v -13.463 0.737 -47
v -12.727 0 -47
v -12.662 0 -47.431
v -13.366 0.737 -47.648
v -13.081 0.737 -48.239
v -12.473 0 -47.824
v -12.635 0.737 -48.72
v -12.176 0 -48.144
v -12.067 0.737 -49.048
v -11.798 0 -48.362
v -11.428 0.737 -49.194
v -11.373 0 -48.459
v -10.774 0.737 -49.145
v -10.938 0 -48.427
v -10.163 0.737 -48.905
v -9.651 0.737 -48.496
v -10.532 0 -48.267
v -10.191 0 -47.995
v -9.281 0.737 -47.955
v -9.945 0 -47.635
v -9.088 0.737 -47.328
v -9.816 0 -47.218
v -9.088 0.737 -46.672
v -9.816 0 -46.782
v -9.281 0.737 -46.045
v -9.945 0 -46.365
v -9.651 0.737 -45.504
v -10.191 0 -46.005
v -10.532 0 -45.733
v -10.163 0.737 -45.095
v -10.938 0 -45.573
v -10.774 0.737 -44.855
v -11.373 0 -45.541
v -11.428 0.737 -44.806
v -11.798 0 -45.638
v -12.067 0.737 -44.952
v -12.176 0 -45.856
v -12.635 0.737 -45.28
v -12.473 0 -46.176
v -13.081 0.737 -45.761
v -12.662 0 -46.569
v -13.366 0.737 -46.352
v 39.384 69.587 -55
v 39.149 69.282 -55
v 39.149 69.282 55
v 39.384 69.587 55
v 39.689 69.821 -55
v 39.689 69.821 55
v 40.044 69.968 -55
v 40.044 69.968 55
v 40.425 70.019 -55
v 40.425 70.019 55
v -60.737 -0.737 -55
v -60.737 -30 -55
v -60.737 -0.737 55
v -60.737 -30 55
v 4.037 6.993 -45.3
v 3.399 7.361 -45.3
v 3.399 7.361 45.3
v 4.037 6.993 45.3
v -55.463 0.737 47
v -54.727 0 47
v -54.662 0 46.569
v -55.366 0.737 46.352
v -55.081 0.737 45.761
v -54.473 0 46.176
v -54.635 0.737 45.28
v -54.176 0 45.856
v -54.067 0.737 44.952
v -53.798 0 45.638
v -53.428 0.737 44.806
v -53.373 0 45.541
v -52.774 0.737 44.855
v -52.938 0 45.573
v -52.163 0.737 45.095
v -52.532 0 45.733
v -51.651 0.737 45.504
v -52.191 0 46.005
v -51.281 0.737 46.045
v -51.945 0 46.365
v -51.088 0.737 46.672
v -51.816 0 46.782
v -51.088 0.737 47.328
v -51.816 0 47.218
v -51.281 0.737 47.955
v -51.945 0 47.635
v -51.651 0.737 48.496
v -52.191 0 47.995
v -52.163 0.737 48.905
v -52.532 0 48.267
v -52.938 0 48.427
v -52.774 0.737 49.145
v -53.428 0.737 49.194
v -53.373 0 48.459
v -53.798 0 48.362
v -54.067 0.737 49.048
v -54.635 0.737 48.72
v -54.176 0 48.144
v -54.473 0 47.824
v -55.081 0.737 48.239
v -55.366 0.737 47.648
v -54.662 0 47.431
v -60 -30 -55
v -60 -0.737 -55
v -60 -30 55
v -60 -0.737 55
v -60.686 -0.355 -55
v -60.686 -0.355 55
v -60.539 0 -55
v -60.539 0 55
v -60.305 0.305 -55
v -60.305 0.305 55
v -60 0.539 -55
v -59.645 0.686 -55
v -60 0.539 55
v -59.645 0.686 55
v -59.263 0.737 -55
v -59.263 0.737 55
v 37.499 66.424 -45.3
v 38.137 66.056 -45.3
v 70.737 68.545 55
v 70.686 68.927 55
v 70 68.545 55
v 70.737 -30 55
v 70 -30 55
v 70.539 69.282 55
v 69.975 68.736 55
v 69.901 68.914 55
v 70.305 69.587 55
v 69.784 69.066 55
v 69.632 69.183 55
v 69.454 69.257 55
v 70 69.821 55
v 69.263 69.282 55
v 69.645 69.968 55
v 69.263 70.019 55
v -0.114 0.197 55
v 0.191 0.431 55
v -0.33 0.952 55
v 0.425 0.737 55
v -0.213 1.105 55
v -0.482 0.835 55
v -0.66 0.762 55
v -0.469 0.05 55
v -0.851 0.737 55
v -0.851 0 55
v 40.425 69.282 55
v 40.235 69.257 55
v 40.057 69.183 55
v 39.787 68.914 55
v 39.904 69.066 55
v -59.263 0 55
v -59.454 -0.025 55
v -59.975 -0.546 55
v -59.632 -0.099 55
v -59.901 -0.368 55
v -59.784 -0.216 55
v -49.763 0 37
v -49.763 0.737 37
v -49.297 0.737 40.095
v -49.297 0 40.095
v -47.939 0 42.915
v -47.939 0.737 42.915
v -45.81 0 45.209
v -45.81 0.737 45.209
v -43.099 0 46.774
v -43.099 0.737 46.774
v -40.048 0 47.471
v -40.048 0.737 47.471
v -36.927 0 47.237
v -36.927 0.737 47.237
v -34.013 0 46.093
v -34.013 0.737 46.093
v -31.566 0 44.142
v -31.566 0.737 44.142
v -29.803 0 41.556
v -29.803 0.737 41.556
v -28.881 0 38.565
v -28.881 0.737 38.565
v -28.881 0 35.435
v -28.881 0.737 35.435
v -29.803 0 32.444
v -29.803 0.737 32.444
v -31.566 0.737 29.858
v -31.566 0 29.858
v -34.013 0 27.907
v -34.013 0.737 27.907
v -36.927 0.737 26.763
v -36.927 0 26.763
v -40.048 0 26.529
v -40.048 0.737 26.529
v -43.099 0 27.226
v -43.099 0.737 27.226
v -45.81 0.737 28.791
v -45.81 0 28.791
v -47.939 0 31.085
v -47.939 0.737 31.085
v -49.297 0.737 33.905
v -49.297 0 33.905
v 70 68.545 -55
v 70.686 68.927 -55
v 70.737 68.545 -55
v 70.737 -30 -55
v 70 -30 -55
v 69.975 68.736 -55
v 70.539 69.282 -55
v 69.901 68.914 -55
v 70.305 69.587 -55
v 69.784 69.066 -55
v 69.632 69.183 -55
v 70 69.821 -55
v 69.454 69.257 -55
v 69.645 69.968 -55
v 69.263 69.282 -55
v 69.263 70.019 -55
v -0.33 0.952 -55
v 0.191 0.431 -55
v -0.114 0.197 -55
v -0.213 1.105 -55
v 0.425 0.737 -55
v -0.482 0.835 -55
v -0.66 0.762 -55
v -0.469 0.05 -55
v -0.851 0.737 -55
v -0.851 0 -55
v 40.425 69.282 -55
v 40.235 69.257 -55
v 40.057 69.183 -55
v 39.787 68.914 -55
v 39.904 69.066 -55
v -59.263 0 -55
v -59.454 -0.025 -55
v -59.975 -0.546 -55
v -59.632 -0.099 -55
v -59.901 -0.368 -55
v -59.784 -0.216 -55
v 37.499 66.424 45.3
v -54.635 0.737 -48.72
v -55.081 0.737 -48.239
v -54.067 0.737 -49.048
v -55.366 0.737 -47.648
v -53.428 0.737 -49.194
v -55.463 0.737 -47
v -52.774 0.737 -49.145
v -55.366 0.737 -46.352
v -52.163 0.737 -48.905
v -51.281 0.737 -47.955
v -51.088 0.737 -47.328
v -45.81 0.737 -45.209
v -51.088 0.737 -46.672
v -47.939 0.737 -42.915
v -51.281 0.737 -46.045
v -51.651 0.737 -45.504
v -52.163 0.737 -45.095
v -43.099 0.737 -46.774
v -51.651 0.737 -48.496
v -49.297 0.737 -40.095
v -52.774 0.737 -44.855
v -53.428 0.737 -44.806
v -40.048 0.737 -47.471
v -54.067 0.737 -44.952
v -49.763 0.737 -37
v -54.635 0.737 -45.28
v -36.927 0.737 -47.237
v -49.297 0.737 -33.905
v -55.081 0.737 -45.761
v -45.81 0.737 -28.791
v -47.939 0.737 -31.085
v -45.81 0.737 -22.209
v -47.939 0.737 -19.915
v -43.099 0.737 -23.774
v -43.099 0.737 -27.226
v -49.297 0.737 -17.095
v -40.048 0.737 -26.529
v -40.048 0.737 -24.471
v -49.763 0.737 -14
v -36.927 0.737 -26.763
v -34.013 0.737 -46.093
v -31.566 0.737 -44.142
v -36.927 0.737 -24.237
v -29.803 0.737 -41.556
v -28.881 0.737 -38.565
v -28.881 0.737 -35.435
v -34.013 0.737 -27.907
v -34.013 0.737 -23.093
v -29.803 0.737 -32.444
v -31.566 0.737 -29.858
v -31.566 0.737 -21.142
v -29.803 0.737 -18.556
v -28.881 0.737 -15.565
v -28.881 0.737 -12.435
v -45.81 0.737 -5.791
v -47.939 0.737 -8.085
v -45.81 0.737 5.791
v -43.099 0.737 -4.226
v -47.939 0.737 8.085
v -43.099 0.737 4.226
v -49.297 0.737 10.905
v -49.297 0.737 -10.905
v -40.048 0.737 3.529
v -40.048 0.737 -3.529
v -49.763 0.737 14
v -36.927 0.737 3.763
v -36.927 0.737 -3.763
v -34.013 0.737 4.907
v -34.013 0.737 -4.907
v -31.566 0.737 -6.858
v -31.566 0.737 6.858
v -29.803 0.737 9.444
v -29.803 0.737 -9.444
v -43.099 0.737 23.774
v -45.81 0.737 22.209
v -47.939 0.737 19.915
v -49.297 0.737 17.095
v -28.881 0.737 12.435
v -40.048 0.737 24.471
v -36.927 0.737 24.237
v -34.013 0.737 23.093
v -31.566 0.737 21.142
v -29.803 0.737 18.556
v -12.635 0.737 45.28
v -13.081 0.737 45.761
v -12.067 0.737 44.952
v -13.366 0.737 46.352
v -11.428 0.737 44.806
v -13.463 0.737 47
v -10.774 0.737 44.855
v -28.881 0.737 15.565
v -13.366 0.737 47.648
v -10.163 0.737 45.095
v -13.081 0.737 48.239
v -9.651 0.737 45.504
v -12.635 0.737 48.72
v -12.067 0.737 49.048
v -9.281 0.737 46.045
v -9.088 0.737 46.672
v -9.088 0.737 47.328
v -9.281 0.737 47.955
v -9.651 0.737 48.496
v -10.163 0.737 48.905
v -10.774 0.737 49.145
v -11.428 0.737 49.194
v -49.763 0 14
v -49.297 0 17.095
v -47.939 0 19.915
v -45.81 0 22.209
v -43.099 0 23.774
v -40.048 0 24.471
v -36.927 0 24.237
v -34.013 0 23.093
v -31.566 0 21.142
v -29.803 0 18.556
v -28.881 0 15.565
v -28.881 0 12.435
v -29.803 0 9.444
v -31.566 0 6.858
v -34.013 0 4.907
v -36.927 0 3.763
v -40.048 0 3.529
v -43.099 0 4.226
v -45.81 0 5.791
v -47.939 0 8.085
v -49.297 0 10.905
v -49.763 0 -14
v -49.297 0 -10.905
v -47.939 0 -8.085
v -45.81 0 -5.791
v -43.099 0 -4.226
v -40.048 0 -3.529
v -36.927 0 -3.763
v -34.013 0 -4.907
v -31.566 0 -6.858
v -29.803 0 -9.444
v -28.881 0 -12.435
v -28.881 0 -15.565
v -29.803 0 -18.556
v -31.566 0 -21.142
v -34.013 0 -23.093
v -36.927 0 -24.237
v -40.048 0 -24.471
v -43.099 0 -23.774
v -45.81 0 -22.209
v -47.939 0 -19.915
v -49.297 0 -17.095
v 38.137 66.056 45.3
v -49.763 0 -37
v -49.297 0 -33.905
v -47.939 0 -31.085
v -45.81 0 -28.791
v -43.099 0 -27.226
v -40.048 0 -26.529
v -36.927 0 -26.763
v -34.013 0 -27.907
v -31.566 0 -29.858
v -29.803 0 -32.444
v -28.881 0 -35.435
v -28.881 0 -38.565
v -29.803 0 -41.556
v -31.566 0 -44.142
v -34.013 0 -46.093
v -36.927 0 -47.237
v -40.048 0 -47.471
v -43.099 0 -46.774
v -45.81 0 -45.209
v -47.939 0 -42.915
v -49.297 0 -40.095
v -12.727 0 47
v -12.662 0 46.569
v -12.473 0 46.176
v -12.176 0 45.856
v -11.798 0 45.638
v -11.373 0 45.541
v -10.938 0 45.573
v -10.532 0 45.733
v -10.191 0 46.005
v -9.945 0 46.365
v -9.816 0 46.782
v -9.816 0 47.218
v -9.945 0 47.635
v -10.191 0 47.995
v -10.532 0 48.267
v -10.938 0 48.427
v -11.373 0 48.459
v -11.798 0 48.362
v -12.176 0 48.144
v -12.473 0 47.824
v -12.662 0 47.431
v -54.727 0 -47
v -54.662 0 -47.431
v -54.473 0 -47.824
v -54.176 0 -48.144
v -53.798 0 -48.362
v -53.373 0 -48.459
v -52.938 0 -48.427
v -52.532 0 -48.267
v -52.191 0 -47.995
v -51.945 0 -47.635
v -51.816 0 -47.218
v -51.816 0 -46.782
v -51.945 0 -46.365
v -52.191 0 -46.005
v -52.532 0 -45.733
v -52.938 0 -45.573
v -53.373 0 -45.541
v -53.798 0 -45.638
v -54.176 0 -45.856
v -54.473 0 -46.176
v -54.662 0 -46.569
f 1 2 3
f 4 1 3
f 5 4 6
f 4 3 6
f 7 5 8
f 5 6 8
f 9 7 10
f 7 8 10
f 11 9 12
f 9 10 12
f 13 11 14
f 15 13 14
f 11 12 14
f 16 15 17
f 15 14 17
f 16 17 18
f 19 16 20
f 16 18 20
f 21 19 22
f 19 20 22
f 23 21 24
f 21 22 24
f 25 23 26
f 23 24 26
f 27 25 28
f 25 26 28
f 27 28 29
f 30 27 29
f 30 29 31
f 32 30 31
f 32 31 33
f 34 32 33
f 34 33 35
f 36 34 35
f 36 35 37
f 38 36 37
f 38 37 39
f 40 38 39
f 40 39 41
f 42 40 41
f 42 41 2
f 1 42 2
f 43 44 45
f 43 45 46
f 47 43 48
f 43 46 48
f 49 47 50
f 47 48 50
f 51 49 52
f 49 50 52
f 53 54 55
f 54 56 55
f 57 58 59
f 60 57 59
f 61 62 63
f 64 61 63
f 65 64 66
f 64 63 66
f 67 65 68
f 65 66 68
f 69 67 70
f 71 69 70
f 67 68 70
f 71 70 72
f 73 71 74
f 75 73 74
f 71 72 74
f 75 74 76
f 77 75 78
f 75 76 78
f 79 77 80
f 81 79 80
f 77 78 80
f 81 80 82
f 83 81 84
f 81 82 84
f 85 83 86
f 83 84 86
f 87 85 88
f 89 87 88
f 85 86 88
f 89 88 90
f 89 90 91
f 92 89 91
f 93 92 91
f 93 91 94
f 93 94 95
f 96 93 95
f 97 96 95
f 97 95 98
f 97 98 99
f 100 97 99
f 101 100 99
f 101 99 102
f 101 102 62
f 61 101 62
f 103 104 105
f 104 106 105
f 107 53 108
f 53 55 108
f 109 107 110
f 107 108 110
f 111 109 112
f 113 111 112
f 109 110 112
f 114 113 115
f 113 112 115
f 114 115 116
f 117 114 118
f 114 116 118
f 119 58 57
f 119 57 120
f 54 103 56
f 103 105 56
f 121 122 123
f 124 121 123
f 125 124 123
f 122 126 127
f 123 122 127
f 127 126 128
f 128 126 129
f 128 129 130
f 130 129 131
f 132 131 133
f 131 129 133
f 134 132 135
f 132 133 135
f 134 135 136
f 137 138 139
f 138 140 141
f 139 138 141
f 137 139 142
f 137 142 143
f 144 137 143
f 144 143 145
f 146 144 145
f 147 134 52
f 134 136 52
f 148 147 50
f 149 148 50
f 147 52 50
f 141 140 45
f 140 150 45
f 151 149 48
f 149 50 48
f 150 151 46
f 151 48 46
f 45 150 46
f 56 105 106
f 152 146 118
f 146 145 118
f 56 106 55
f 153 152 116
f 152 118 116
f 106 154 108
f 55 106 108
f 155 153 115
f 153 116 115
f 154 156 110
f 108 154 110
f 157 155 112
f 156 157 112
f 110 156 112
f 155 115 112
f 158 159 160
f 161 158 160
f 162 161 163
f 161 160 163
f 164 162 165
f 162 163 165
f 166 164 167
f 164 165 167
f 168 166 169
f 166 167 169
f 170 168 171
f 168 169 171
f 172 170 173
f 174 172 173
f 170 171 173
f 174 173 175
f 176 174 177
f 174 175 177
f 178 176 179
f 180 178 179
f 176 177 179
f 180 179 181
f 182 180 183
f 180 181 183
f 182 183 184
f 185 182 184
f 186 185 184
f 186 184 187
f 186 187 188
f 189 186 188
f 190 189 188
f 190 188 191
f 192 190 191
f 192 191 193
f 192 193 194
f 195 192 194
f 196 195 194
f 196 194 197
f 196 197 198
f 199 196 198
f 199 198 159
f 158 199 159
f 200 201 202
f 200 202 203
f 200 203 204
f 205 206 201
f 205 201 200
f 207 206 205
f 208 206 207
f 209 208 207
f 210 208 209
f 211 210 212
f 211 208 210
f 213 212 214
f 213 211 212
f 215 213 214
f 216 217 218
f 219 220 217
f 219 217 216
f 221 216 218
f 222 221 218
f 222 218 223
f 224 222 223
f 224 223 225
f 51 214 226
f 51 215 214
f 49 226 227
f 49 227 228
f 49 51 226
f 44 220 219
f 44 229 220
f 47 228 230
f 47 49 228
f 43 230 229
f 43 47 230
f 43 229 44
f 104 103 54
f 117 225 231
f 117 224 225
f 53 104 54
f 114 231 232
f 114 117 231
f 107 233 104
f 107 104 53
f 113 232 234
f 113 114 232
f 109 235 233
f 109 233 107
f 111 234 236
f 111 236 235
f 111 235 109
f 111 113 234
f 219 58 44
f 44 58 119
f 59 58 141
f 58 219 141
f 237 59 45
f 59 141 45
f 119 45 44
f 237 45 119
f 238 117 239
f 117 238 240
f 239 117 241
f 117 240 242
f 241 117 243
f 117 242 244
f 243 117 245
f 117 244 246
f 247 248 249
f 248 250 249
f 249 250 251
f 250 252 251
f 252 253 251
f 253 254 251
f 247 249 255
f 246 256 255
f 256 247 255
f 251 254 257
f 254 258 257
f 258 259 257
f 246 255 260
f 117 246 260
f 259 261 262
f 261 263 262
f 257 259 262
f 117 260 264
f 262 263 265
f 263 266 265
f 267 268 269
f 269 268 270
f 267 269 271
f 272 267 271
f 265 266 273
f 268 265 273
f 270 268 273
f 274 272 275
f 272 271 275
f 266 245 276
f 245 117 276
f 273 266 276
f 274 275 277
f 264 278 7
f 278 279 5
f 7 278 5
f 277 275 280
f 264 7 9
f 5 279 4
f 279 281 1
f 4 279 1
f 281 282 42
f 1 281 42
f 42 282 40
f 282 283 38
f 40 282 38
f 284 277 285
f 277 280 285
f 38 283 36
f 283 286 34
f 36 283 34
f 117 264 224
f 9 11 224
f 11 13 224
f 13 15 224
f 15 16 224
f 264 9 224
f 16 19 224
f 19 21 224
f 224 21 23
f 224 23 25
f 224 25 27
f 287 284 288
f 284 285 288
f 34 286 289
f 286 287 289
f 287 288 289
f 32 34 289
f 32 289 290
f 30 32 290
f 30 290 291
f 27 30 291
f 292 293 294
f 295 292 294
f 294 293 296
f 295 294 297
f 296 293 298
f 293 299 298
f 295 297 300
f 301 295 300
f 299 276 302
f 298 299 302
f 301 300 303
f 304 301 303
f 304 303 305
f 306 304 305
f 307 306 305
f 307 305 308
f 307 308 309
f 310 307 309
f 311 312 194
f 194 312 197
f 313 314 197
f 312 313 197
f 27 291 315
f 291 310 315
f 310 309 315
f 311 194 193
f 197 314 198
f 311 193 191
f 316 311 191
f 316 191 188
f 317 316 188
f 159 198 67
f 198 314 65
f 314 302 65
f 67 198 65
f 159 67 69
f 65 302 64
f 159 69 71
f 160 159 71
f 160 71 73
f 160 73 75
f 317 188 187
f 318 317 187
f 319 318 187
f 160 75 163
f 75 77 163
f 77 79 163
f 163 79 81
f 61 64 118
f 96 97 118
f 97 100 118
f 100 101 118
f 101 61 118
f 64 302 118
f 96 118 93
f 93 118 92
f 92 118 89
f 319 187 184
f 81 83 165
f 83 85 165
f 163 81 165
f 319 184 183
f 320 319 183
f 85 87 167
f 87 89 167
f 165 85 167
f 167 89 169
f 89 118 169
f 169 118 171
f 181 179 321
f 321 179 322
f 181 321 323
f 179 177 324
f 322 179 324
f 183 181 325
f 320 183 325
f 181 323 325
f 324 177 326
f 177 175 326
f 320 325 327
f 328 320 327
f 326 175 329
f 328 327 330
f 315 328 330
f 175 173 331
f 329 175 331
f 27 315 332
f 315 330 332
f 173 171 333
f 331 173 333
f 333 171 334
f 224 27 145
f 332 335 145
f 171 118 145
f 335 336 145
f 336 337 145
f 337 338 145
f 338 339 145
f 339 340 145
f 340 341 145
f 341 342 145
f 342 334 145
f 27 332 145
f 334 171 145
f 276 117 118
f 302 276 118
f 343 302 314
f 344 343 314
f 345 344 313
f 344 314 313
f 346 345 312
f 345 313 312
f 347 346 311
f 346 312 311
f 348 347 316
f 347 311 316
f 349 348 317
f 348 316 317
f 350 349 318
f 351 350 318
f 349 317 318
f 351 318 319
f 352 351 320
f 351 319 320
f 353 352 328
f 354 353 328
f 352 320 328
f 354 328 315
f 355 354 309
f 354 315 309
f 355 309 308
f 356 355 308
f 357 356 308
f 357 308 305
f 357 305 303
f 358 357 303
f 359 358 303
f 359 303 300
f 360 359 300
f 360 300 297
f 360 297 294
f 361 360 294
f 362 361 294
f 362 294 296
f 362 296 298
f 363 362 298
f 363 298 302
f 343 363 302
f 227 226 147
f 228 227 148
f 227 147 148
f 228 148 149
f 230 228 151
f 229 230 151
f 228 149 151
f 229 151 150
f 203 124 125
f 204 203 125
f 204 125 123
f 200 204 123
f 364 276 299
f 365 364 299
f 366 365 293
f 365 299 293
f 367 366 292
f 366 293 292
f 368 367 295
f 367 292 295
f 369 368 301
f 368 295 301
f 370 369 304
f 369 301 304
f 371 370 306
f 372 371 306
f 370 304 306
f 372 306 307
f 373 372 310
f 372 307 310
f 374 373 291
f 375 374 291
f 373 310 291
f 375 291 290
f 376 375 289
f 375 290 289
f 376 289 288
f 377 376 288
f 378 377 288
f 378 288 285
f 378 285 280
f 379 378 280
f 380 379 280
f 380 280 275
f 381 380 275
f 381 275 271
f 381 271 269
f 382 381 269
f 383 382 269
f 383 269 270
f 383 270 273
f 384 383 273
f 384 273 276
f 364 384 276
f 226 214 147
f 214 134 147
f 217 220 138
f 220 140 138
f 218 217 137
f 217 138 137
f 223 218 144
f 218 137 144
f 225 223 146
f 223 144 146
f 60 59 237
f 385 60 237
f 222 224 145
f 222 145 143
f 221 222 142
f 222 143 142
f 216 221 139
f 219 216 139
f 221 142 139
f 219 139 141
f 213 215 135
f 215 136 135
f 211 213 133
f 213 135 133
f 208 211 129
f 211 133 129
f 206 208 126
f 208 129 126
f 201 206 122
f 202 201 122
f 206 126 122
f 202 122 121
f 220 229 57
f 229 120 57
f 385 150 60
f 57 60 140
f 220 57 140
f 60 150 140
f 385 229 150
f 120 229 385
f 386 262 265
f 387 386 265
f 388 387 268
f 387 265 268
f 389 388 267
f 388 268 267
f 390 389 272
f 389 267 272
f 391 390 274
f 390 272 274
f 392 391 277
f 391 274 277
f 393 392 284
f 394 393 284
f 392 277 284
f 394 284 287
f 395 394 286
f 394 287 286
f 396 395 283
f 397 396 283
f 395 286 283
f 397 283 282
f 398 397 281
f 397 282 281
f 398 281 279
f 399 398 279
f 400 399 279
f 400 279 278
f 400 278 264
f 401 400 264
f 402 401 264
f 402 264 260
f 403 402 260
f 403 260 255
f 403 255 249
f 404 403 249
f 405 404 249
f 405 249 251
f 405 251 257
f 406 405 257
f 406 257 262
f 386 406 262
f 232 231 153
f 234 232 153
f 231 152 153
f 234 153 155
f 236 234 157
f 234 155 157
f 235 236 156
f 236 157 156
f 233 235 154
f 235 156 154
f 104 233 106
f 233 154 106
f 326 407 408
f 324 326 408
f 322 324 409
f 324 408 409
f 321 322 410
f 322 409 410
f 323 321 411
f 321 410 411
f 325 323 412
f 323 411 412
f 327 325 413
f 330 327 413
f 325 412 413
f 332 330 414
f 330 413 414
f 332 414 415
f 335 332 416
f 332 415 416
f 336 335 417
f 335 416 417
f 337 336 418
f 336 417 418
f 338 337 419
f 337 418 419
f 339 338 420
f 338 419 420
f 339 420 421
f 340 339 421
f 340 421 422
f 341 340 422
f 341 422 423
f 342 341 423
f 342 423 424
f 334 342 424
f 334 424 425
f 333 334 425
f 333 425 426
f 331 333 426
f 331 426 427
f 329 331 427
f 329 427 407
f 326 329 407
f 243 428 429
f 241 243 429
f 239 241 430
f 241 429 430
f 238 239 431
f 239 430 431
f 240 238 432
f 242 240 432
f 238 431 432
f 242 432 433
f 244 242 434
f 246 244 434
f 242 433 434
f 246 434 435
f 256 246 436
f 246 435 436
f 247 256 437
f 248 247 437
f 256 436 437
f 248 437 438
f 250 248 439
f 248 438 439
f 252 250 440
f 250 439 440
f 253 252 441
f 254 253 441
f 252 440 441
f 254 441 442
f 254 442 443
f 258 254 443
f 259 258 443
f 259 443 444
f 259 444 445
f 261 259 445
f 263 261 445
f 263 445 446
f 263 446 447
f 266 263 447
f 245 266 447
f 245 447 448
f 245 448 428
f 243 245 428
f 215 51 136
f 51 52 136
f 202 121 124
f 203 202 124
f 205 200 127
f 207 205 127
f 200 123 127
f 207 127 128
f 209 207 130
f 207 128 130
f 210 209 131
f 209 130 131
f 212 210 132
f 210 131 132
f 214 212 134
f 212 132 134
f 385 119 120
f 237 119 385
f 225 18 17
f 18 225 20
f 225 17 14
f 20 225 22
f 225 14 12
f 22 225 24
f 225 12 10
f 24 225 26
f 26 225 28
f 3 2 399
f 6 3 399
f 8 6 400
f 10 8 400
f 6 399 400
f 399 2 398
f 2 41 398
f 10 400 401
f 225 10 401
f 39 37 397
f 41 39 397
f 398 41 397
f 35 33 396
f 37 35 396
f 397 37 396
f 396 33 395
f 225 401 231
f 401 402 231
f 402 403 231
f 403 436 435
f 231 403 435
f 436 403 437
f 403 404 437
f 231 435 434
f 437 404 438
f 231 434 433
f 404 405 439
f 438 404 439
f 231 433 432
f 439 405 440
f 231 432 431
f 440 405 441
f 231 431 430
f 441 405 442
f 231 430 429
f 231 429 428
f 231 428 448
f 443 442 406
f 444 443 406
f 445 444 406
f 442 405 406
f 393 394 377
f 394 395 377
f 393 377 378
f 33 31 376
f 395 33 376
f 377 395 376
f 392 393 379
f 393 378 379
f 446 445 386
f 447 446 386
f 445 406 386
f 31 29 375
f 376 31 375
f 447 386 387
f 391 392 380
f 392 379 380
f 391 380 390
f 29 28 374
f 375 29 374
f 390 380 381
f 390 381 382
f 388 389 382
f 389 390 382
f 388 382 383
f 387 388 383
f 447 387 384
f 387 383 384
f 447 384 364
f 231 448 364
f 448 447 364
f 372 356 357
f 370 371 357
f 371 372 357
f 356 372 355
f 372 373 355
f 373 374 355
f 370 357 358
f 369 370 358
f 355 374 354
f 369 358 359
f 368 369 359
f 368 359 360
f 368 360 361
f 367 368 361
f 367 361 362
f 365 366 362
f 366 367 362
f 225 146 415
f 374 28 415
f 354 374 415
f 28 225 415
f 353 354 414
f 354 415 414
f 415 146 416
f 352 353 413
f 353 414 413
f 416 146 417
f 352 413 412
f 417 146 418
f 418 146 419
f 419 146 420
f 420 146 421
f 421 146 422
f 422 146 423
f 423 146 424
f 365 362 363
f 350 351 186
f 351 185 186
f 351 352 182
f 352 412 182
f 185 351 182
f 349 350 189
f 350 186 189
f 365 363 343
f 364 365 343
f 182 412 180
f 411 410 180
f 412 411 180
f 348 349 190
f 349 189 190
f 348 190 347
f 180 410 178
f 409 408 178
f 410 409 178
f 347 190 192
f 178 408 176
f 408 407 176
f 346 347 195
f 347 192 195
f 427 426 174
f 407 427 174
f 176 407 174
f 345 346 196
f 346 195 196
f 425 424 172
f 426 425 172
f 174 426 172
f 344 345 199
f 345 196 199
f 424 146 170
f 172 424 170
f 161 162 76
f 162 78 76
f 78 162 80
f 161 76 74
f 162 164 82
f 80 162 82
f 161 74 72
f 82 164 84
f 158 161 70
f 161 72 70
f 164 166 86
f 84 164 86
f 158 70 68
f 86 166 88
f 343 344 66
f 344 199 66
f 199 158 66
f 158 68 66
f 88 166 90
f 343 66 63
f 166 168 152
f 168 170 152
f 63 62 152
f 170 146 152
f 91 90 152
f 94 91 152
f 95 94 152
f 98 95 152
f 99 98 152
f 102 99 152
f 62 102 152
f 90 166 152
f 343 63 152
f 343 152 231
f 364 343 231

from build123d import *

# Parameters (mm, degrees)
BASE_FLANGE1_DEPTH                              = 55
CUT_EXTRUDE2_REACH                              = 115.264
SKETCH6_R                                       = 10.5
CUT_EXTRUDE3_REACH                              = 115.888
SKETCH7_W                                       = 90.6
SKETCH7_H                                       = 68.2
CSK_FOR_M2_FLAT_HEAD_MACHINE_SCREW1_D           = 2.4
CSK_FOR_M2_FLAT_HEAD_MACHINE_SCREW1_CSINK_D     = 4.4
CSK_FOR_M2_FLAT_HEAD_MACHINE_SCREW1_CSINK_ANGLE = 90


# Sheet-metal steps are written as plain solids
with BuildPart() as part:
    # Sketch1 → Base-Flange1 (new, symmetric)
    with BuildSketch(Plane.XY):
        with BuildLine():
            Line((70, -30), (70, 68.545432303))
            ThreePointArc((70, 68.545432303), (69.784254855, 69.066287158), (69.2634, 69.282032303))
            Line((69.2634, 69.282032303), (40.425276208, 69.282032303))
            ThreePointArc((40.425276208, 69.282032303), (40.056976208, 69.183346615), (39.787361896, 68.913732303))
            Line((39.787361896, 68.913732303), (0.425276208, 0.7366))
            ThreePointArc((0.425276208, 0.7366), (-0.113952417, 0.197371375), (-0.850552417, 0))
            Line((-0.850552417, 0), (-59.2634, 0))
            ThreePointArc((-59.2634, 0), (-59.784254855, -0.215745145), (-60, -0.7366))
            Line((-60, -0.7366), (-60, -30))
            Line((-60, -30), (-60.7366, -30))
            Line((-60.7366, -30), (-60.7366, -0.7366))
            ThreePointArc((-60.7366, -0.7366), (-60.30510971, 0.30510971), (-59.2634, 0.7366))
            Line((-59.2634, 0.7366), (-0.850552417, 0.7366))
            ThreePointArc((-0.850552417, 0.7366), (-0.482252417, 0.835285688), (-0.212638104, 1.1049))
            Line((-0.212638104, 1.1049), (39.149447583, 69.282032303))
            ThreePointArc((39.149447583, 69.282032303), (39.688676208, 69.821260928), (40.425276208, 70.018632303))
            Line((40.425276208, 70.018632303), (69.2634, 70.018632303))
            ThreePointArc((69.2634, 70.018632303), (70.30510971, 69.587142013), (70.7366, 68.545432303))
            Line((70.7366, 68.545432303), (70.7366, -30))
            Line((70.7366, -30), (70, -30))
        make_face()
    extrude(amount=BASE_FLANGE1_DEPTH, both=True)

    # Sketch6 → Cut-Extrude2 (cut, up to next)
    with BuildSketch(Plane(origin=(0, 0.7366, 0), x_dir=(1, 0, 0), z_dir=(0, 1, 0)), mode=Mode.PRIVATE) as cut_extrude2_sk1:
        with Locations(Location((-39.2634, 14, 0), (0, 0, 180))):
            Circle(SKETCH6_R)
    cut_extrude2_tool1 = extrude(cut_extrude2_sk1.sketch, amount=-CUT_EXTRUDE2_REACH, mode=Mode.PRIVATE) & part.part
    # Sketch6 → Cut-Extrude2 (cut, up to next)
    with BuildSketch(Plane(origin=(0, 0.7366, 0), x_dir=(1, 0, 0), z_dir=(0, 1, 0)), mode=Mode.PRIVATE) as cut_extrude2_sk2:
        with Locations(Location((-39.2634, 37, 0), (0, 0, 180))):
            Circle(SKETCH6_R)
    cut_extrude2_tool2 = extrude(cut_extrude2_sk2.sketch, amount=-CUT_EXTRUDE2_REACH, mode=Mode.PRIVATE) & part.part
    # Sketch6 → Cut-Extrude2 (cut, up to next)
    with BuildSketch(Plane(origin=(0, 0.7366, 0), x_dir=(1, 0, 0), z_dir=(0, 1, 0)), mode=Mode.PRIVATE) as cut_extrude2_sk3:
        with Locations(Location((-39.2634, -14, 0), (0, 0, 180))):
            Circle(SKETCH6_R)
    cut_extrude2_tool3 = extrude(cut_extrude2_sk3.sketch, amount=-CUT_EXTRUDE2_REACH, mode=Mode.PRIVATE) & part.part
    # Sketch6 → Cut-Extrude2 (cut, up to next)
    with BuildSketch(Plane(origin=(0, 0.7366, 0), x_dir=(1, 0, 0), z_dir=(0, 1, 0)), mode=Mode.PRIVATE) as cut_extrude2_sk4:
        with Locations(Location((-39.2634, -37, 0), (0, 0, 180))):
            Circle(SKETCH6_R)
    cut_extrude2_tool4 = extrude(cut_extrude2_sk4.sketch, amount=-CUT_EXTRUDE2_REACH, mode=Mode.PRIVATE) & part.part
    add(cut_extrude2_tool1.solids().sort_by_distance((-39.2634, 0.7366, -14))[0], mode=Mode.SUBTRACT)
    add(cut_extrude2_tool2.solids().sort_by_distance((-39.2634, 0.7366, -37))[0], mode=Mode.SUBTRACT)
    add(cut_extrude2_tool3.solids().sort_by_distance((-39.2634, 0.7366, 14))[0], mode=Mode.SUBTRACT)
    add(cut_extrude2_tool4.solids().sort_by_distance((-39.2634, 0.7366, 37))[0], mode=Mode.SUBTRACT)

    # Sketch7 → Cut-Extrude3 (cut, up to next)
    with BuildSketch(Plane(origin=(-0.637914312, 0.3683, 0), x_dir=(0, 0, 1), z_dir=(-0.8660254037844365, 0.500000000000004, 0)), mode=Mode.PRIVATE) as cut_extrude3_sk1:
        with Locations((0, 42.174723792)):
            Rectangle(SKETCH7_W, SKETCH7_H)
    cut_extrude3_tool1 = extrude(cut_extrude3_sk1.sketch, amount=-CUT_EXTRUDE3_REACH, mode=Mode.PRIVATE) & part.part
    add(cut_extrude3_tool1.solids().sort_by_distance((20.449448, 36.892682, 0))[0], mode=Mode.SUBTRACT)

    # CSK for M2 Flat Head Machine Screw1 (through all)
    with Locations(Plane(origin=(0, 0.7366, 0), x_dir=(1, 0, 0), z_dir=(0, 1, 0))):
        with Locations((-53.2634, 47), (-11.2634, 47), (-11.2634, -47), (-53.2634, -47)):
            CounterSinkHole(CSK_FOR_M2_FLAT_HEAD_MACHINE_SCREW1_D / 2, CSK_FOR_M2_FLAT_HEAD_MACHINE_SCREW1_CSINK_D / 2, counter_sink_angle=CSK_FOR_M2_FLAT_HEAD_MACHINE_SCREW1_CSINK_ANGLE)


solid = part.part
